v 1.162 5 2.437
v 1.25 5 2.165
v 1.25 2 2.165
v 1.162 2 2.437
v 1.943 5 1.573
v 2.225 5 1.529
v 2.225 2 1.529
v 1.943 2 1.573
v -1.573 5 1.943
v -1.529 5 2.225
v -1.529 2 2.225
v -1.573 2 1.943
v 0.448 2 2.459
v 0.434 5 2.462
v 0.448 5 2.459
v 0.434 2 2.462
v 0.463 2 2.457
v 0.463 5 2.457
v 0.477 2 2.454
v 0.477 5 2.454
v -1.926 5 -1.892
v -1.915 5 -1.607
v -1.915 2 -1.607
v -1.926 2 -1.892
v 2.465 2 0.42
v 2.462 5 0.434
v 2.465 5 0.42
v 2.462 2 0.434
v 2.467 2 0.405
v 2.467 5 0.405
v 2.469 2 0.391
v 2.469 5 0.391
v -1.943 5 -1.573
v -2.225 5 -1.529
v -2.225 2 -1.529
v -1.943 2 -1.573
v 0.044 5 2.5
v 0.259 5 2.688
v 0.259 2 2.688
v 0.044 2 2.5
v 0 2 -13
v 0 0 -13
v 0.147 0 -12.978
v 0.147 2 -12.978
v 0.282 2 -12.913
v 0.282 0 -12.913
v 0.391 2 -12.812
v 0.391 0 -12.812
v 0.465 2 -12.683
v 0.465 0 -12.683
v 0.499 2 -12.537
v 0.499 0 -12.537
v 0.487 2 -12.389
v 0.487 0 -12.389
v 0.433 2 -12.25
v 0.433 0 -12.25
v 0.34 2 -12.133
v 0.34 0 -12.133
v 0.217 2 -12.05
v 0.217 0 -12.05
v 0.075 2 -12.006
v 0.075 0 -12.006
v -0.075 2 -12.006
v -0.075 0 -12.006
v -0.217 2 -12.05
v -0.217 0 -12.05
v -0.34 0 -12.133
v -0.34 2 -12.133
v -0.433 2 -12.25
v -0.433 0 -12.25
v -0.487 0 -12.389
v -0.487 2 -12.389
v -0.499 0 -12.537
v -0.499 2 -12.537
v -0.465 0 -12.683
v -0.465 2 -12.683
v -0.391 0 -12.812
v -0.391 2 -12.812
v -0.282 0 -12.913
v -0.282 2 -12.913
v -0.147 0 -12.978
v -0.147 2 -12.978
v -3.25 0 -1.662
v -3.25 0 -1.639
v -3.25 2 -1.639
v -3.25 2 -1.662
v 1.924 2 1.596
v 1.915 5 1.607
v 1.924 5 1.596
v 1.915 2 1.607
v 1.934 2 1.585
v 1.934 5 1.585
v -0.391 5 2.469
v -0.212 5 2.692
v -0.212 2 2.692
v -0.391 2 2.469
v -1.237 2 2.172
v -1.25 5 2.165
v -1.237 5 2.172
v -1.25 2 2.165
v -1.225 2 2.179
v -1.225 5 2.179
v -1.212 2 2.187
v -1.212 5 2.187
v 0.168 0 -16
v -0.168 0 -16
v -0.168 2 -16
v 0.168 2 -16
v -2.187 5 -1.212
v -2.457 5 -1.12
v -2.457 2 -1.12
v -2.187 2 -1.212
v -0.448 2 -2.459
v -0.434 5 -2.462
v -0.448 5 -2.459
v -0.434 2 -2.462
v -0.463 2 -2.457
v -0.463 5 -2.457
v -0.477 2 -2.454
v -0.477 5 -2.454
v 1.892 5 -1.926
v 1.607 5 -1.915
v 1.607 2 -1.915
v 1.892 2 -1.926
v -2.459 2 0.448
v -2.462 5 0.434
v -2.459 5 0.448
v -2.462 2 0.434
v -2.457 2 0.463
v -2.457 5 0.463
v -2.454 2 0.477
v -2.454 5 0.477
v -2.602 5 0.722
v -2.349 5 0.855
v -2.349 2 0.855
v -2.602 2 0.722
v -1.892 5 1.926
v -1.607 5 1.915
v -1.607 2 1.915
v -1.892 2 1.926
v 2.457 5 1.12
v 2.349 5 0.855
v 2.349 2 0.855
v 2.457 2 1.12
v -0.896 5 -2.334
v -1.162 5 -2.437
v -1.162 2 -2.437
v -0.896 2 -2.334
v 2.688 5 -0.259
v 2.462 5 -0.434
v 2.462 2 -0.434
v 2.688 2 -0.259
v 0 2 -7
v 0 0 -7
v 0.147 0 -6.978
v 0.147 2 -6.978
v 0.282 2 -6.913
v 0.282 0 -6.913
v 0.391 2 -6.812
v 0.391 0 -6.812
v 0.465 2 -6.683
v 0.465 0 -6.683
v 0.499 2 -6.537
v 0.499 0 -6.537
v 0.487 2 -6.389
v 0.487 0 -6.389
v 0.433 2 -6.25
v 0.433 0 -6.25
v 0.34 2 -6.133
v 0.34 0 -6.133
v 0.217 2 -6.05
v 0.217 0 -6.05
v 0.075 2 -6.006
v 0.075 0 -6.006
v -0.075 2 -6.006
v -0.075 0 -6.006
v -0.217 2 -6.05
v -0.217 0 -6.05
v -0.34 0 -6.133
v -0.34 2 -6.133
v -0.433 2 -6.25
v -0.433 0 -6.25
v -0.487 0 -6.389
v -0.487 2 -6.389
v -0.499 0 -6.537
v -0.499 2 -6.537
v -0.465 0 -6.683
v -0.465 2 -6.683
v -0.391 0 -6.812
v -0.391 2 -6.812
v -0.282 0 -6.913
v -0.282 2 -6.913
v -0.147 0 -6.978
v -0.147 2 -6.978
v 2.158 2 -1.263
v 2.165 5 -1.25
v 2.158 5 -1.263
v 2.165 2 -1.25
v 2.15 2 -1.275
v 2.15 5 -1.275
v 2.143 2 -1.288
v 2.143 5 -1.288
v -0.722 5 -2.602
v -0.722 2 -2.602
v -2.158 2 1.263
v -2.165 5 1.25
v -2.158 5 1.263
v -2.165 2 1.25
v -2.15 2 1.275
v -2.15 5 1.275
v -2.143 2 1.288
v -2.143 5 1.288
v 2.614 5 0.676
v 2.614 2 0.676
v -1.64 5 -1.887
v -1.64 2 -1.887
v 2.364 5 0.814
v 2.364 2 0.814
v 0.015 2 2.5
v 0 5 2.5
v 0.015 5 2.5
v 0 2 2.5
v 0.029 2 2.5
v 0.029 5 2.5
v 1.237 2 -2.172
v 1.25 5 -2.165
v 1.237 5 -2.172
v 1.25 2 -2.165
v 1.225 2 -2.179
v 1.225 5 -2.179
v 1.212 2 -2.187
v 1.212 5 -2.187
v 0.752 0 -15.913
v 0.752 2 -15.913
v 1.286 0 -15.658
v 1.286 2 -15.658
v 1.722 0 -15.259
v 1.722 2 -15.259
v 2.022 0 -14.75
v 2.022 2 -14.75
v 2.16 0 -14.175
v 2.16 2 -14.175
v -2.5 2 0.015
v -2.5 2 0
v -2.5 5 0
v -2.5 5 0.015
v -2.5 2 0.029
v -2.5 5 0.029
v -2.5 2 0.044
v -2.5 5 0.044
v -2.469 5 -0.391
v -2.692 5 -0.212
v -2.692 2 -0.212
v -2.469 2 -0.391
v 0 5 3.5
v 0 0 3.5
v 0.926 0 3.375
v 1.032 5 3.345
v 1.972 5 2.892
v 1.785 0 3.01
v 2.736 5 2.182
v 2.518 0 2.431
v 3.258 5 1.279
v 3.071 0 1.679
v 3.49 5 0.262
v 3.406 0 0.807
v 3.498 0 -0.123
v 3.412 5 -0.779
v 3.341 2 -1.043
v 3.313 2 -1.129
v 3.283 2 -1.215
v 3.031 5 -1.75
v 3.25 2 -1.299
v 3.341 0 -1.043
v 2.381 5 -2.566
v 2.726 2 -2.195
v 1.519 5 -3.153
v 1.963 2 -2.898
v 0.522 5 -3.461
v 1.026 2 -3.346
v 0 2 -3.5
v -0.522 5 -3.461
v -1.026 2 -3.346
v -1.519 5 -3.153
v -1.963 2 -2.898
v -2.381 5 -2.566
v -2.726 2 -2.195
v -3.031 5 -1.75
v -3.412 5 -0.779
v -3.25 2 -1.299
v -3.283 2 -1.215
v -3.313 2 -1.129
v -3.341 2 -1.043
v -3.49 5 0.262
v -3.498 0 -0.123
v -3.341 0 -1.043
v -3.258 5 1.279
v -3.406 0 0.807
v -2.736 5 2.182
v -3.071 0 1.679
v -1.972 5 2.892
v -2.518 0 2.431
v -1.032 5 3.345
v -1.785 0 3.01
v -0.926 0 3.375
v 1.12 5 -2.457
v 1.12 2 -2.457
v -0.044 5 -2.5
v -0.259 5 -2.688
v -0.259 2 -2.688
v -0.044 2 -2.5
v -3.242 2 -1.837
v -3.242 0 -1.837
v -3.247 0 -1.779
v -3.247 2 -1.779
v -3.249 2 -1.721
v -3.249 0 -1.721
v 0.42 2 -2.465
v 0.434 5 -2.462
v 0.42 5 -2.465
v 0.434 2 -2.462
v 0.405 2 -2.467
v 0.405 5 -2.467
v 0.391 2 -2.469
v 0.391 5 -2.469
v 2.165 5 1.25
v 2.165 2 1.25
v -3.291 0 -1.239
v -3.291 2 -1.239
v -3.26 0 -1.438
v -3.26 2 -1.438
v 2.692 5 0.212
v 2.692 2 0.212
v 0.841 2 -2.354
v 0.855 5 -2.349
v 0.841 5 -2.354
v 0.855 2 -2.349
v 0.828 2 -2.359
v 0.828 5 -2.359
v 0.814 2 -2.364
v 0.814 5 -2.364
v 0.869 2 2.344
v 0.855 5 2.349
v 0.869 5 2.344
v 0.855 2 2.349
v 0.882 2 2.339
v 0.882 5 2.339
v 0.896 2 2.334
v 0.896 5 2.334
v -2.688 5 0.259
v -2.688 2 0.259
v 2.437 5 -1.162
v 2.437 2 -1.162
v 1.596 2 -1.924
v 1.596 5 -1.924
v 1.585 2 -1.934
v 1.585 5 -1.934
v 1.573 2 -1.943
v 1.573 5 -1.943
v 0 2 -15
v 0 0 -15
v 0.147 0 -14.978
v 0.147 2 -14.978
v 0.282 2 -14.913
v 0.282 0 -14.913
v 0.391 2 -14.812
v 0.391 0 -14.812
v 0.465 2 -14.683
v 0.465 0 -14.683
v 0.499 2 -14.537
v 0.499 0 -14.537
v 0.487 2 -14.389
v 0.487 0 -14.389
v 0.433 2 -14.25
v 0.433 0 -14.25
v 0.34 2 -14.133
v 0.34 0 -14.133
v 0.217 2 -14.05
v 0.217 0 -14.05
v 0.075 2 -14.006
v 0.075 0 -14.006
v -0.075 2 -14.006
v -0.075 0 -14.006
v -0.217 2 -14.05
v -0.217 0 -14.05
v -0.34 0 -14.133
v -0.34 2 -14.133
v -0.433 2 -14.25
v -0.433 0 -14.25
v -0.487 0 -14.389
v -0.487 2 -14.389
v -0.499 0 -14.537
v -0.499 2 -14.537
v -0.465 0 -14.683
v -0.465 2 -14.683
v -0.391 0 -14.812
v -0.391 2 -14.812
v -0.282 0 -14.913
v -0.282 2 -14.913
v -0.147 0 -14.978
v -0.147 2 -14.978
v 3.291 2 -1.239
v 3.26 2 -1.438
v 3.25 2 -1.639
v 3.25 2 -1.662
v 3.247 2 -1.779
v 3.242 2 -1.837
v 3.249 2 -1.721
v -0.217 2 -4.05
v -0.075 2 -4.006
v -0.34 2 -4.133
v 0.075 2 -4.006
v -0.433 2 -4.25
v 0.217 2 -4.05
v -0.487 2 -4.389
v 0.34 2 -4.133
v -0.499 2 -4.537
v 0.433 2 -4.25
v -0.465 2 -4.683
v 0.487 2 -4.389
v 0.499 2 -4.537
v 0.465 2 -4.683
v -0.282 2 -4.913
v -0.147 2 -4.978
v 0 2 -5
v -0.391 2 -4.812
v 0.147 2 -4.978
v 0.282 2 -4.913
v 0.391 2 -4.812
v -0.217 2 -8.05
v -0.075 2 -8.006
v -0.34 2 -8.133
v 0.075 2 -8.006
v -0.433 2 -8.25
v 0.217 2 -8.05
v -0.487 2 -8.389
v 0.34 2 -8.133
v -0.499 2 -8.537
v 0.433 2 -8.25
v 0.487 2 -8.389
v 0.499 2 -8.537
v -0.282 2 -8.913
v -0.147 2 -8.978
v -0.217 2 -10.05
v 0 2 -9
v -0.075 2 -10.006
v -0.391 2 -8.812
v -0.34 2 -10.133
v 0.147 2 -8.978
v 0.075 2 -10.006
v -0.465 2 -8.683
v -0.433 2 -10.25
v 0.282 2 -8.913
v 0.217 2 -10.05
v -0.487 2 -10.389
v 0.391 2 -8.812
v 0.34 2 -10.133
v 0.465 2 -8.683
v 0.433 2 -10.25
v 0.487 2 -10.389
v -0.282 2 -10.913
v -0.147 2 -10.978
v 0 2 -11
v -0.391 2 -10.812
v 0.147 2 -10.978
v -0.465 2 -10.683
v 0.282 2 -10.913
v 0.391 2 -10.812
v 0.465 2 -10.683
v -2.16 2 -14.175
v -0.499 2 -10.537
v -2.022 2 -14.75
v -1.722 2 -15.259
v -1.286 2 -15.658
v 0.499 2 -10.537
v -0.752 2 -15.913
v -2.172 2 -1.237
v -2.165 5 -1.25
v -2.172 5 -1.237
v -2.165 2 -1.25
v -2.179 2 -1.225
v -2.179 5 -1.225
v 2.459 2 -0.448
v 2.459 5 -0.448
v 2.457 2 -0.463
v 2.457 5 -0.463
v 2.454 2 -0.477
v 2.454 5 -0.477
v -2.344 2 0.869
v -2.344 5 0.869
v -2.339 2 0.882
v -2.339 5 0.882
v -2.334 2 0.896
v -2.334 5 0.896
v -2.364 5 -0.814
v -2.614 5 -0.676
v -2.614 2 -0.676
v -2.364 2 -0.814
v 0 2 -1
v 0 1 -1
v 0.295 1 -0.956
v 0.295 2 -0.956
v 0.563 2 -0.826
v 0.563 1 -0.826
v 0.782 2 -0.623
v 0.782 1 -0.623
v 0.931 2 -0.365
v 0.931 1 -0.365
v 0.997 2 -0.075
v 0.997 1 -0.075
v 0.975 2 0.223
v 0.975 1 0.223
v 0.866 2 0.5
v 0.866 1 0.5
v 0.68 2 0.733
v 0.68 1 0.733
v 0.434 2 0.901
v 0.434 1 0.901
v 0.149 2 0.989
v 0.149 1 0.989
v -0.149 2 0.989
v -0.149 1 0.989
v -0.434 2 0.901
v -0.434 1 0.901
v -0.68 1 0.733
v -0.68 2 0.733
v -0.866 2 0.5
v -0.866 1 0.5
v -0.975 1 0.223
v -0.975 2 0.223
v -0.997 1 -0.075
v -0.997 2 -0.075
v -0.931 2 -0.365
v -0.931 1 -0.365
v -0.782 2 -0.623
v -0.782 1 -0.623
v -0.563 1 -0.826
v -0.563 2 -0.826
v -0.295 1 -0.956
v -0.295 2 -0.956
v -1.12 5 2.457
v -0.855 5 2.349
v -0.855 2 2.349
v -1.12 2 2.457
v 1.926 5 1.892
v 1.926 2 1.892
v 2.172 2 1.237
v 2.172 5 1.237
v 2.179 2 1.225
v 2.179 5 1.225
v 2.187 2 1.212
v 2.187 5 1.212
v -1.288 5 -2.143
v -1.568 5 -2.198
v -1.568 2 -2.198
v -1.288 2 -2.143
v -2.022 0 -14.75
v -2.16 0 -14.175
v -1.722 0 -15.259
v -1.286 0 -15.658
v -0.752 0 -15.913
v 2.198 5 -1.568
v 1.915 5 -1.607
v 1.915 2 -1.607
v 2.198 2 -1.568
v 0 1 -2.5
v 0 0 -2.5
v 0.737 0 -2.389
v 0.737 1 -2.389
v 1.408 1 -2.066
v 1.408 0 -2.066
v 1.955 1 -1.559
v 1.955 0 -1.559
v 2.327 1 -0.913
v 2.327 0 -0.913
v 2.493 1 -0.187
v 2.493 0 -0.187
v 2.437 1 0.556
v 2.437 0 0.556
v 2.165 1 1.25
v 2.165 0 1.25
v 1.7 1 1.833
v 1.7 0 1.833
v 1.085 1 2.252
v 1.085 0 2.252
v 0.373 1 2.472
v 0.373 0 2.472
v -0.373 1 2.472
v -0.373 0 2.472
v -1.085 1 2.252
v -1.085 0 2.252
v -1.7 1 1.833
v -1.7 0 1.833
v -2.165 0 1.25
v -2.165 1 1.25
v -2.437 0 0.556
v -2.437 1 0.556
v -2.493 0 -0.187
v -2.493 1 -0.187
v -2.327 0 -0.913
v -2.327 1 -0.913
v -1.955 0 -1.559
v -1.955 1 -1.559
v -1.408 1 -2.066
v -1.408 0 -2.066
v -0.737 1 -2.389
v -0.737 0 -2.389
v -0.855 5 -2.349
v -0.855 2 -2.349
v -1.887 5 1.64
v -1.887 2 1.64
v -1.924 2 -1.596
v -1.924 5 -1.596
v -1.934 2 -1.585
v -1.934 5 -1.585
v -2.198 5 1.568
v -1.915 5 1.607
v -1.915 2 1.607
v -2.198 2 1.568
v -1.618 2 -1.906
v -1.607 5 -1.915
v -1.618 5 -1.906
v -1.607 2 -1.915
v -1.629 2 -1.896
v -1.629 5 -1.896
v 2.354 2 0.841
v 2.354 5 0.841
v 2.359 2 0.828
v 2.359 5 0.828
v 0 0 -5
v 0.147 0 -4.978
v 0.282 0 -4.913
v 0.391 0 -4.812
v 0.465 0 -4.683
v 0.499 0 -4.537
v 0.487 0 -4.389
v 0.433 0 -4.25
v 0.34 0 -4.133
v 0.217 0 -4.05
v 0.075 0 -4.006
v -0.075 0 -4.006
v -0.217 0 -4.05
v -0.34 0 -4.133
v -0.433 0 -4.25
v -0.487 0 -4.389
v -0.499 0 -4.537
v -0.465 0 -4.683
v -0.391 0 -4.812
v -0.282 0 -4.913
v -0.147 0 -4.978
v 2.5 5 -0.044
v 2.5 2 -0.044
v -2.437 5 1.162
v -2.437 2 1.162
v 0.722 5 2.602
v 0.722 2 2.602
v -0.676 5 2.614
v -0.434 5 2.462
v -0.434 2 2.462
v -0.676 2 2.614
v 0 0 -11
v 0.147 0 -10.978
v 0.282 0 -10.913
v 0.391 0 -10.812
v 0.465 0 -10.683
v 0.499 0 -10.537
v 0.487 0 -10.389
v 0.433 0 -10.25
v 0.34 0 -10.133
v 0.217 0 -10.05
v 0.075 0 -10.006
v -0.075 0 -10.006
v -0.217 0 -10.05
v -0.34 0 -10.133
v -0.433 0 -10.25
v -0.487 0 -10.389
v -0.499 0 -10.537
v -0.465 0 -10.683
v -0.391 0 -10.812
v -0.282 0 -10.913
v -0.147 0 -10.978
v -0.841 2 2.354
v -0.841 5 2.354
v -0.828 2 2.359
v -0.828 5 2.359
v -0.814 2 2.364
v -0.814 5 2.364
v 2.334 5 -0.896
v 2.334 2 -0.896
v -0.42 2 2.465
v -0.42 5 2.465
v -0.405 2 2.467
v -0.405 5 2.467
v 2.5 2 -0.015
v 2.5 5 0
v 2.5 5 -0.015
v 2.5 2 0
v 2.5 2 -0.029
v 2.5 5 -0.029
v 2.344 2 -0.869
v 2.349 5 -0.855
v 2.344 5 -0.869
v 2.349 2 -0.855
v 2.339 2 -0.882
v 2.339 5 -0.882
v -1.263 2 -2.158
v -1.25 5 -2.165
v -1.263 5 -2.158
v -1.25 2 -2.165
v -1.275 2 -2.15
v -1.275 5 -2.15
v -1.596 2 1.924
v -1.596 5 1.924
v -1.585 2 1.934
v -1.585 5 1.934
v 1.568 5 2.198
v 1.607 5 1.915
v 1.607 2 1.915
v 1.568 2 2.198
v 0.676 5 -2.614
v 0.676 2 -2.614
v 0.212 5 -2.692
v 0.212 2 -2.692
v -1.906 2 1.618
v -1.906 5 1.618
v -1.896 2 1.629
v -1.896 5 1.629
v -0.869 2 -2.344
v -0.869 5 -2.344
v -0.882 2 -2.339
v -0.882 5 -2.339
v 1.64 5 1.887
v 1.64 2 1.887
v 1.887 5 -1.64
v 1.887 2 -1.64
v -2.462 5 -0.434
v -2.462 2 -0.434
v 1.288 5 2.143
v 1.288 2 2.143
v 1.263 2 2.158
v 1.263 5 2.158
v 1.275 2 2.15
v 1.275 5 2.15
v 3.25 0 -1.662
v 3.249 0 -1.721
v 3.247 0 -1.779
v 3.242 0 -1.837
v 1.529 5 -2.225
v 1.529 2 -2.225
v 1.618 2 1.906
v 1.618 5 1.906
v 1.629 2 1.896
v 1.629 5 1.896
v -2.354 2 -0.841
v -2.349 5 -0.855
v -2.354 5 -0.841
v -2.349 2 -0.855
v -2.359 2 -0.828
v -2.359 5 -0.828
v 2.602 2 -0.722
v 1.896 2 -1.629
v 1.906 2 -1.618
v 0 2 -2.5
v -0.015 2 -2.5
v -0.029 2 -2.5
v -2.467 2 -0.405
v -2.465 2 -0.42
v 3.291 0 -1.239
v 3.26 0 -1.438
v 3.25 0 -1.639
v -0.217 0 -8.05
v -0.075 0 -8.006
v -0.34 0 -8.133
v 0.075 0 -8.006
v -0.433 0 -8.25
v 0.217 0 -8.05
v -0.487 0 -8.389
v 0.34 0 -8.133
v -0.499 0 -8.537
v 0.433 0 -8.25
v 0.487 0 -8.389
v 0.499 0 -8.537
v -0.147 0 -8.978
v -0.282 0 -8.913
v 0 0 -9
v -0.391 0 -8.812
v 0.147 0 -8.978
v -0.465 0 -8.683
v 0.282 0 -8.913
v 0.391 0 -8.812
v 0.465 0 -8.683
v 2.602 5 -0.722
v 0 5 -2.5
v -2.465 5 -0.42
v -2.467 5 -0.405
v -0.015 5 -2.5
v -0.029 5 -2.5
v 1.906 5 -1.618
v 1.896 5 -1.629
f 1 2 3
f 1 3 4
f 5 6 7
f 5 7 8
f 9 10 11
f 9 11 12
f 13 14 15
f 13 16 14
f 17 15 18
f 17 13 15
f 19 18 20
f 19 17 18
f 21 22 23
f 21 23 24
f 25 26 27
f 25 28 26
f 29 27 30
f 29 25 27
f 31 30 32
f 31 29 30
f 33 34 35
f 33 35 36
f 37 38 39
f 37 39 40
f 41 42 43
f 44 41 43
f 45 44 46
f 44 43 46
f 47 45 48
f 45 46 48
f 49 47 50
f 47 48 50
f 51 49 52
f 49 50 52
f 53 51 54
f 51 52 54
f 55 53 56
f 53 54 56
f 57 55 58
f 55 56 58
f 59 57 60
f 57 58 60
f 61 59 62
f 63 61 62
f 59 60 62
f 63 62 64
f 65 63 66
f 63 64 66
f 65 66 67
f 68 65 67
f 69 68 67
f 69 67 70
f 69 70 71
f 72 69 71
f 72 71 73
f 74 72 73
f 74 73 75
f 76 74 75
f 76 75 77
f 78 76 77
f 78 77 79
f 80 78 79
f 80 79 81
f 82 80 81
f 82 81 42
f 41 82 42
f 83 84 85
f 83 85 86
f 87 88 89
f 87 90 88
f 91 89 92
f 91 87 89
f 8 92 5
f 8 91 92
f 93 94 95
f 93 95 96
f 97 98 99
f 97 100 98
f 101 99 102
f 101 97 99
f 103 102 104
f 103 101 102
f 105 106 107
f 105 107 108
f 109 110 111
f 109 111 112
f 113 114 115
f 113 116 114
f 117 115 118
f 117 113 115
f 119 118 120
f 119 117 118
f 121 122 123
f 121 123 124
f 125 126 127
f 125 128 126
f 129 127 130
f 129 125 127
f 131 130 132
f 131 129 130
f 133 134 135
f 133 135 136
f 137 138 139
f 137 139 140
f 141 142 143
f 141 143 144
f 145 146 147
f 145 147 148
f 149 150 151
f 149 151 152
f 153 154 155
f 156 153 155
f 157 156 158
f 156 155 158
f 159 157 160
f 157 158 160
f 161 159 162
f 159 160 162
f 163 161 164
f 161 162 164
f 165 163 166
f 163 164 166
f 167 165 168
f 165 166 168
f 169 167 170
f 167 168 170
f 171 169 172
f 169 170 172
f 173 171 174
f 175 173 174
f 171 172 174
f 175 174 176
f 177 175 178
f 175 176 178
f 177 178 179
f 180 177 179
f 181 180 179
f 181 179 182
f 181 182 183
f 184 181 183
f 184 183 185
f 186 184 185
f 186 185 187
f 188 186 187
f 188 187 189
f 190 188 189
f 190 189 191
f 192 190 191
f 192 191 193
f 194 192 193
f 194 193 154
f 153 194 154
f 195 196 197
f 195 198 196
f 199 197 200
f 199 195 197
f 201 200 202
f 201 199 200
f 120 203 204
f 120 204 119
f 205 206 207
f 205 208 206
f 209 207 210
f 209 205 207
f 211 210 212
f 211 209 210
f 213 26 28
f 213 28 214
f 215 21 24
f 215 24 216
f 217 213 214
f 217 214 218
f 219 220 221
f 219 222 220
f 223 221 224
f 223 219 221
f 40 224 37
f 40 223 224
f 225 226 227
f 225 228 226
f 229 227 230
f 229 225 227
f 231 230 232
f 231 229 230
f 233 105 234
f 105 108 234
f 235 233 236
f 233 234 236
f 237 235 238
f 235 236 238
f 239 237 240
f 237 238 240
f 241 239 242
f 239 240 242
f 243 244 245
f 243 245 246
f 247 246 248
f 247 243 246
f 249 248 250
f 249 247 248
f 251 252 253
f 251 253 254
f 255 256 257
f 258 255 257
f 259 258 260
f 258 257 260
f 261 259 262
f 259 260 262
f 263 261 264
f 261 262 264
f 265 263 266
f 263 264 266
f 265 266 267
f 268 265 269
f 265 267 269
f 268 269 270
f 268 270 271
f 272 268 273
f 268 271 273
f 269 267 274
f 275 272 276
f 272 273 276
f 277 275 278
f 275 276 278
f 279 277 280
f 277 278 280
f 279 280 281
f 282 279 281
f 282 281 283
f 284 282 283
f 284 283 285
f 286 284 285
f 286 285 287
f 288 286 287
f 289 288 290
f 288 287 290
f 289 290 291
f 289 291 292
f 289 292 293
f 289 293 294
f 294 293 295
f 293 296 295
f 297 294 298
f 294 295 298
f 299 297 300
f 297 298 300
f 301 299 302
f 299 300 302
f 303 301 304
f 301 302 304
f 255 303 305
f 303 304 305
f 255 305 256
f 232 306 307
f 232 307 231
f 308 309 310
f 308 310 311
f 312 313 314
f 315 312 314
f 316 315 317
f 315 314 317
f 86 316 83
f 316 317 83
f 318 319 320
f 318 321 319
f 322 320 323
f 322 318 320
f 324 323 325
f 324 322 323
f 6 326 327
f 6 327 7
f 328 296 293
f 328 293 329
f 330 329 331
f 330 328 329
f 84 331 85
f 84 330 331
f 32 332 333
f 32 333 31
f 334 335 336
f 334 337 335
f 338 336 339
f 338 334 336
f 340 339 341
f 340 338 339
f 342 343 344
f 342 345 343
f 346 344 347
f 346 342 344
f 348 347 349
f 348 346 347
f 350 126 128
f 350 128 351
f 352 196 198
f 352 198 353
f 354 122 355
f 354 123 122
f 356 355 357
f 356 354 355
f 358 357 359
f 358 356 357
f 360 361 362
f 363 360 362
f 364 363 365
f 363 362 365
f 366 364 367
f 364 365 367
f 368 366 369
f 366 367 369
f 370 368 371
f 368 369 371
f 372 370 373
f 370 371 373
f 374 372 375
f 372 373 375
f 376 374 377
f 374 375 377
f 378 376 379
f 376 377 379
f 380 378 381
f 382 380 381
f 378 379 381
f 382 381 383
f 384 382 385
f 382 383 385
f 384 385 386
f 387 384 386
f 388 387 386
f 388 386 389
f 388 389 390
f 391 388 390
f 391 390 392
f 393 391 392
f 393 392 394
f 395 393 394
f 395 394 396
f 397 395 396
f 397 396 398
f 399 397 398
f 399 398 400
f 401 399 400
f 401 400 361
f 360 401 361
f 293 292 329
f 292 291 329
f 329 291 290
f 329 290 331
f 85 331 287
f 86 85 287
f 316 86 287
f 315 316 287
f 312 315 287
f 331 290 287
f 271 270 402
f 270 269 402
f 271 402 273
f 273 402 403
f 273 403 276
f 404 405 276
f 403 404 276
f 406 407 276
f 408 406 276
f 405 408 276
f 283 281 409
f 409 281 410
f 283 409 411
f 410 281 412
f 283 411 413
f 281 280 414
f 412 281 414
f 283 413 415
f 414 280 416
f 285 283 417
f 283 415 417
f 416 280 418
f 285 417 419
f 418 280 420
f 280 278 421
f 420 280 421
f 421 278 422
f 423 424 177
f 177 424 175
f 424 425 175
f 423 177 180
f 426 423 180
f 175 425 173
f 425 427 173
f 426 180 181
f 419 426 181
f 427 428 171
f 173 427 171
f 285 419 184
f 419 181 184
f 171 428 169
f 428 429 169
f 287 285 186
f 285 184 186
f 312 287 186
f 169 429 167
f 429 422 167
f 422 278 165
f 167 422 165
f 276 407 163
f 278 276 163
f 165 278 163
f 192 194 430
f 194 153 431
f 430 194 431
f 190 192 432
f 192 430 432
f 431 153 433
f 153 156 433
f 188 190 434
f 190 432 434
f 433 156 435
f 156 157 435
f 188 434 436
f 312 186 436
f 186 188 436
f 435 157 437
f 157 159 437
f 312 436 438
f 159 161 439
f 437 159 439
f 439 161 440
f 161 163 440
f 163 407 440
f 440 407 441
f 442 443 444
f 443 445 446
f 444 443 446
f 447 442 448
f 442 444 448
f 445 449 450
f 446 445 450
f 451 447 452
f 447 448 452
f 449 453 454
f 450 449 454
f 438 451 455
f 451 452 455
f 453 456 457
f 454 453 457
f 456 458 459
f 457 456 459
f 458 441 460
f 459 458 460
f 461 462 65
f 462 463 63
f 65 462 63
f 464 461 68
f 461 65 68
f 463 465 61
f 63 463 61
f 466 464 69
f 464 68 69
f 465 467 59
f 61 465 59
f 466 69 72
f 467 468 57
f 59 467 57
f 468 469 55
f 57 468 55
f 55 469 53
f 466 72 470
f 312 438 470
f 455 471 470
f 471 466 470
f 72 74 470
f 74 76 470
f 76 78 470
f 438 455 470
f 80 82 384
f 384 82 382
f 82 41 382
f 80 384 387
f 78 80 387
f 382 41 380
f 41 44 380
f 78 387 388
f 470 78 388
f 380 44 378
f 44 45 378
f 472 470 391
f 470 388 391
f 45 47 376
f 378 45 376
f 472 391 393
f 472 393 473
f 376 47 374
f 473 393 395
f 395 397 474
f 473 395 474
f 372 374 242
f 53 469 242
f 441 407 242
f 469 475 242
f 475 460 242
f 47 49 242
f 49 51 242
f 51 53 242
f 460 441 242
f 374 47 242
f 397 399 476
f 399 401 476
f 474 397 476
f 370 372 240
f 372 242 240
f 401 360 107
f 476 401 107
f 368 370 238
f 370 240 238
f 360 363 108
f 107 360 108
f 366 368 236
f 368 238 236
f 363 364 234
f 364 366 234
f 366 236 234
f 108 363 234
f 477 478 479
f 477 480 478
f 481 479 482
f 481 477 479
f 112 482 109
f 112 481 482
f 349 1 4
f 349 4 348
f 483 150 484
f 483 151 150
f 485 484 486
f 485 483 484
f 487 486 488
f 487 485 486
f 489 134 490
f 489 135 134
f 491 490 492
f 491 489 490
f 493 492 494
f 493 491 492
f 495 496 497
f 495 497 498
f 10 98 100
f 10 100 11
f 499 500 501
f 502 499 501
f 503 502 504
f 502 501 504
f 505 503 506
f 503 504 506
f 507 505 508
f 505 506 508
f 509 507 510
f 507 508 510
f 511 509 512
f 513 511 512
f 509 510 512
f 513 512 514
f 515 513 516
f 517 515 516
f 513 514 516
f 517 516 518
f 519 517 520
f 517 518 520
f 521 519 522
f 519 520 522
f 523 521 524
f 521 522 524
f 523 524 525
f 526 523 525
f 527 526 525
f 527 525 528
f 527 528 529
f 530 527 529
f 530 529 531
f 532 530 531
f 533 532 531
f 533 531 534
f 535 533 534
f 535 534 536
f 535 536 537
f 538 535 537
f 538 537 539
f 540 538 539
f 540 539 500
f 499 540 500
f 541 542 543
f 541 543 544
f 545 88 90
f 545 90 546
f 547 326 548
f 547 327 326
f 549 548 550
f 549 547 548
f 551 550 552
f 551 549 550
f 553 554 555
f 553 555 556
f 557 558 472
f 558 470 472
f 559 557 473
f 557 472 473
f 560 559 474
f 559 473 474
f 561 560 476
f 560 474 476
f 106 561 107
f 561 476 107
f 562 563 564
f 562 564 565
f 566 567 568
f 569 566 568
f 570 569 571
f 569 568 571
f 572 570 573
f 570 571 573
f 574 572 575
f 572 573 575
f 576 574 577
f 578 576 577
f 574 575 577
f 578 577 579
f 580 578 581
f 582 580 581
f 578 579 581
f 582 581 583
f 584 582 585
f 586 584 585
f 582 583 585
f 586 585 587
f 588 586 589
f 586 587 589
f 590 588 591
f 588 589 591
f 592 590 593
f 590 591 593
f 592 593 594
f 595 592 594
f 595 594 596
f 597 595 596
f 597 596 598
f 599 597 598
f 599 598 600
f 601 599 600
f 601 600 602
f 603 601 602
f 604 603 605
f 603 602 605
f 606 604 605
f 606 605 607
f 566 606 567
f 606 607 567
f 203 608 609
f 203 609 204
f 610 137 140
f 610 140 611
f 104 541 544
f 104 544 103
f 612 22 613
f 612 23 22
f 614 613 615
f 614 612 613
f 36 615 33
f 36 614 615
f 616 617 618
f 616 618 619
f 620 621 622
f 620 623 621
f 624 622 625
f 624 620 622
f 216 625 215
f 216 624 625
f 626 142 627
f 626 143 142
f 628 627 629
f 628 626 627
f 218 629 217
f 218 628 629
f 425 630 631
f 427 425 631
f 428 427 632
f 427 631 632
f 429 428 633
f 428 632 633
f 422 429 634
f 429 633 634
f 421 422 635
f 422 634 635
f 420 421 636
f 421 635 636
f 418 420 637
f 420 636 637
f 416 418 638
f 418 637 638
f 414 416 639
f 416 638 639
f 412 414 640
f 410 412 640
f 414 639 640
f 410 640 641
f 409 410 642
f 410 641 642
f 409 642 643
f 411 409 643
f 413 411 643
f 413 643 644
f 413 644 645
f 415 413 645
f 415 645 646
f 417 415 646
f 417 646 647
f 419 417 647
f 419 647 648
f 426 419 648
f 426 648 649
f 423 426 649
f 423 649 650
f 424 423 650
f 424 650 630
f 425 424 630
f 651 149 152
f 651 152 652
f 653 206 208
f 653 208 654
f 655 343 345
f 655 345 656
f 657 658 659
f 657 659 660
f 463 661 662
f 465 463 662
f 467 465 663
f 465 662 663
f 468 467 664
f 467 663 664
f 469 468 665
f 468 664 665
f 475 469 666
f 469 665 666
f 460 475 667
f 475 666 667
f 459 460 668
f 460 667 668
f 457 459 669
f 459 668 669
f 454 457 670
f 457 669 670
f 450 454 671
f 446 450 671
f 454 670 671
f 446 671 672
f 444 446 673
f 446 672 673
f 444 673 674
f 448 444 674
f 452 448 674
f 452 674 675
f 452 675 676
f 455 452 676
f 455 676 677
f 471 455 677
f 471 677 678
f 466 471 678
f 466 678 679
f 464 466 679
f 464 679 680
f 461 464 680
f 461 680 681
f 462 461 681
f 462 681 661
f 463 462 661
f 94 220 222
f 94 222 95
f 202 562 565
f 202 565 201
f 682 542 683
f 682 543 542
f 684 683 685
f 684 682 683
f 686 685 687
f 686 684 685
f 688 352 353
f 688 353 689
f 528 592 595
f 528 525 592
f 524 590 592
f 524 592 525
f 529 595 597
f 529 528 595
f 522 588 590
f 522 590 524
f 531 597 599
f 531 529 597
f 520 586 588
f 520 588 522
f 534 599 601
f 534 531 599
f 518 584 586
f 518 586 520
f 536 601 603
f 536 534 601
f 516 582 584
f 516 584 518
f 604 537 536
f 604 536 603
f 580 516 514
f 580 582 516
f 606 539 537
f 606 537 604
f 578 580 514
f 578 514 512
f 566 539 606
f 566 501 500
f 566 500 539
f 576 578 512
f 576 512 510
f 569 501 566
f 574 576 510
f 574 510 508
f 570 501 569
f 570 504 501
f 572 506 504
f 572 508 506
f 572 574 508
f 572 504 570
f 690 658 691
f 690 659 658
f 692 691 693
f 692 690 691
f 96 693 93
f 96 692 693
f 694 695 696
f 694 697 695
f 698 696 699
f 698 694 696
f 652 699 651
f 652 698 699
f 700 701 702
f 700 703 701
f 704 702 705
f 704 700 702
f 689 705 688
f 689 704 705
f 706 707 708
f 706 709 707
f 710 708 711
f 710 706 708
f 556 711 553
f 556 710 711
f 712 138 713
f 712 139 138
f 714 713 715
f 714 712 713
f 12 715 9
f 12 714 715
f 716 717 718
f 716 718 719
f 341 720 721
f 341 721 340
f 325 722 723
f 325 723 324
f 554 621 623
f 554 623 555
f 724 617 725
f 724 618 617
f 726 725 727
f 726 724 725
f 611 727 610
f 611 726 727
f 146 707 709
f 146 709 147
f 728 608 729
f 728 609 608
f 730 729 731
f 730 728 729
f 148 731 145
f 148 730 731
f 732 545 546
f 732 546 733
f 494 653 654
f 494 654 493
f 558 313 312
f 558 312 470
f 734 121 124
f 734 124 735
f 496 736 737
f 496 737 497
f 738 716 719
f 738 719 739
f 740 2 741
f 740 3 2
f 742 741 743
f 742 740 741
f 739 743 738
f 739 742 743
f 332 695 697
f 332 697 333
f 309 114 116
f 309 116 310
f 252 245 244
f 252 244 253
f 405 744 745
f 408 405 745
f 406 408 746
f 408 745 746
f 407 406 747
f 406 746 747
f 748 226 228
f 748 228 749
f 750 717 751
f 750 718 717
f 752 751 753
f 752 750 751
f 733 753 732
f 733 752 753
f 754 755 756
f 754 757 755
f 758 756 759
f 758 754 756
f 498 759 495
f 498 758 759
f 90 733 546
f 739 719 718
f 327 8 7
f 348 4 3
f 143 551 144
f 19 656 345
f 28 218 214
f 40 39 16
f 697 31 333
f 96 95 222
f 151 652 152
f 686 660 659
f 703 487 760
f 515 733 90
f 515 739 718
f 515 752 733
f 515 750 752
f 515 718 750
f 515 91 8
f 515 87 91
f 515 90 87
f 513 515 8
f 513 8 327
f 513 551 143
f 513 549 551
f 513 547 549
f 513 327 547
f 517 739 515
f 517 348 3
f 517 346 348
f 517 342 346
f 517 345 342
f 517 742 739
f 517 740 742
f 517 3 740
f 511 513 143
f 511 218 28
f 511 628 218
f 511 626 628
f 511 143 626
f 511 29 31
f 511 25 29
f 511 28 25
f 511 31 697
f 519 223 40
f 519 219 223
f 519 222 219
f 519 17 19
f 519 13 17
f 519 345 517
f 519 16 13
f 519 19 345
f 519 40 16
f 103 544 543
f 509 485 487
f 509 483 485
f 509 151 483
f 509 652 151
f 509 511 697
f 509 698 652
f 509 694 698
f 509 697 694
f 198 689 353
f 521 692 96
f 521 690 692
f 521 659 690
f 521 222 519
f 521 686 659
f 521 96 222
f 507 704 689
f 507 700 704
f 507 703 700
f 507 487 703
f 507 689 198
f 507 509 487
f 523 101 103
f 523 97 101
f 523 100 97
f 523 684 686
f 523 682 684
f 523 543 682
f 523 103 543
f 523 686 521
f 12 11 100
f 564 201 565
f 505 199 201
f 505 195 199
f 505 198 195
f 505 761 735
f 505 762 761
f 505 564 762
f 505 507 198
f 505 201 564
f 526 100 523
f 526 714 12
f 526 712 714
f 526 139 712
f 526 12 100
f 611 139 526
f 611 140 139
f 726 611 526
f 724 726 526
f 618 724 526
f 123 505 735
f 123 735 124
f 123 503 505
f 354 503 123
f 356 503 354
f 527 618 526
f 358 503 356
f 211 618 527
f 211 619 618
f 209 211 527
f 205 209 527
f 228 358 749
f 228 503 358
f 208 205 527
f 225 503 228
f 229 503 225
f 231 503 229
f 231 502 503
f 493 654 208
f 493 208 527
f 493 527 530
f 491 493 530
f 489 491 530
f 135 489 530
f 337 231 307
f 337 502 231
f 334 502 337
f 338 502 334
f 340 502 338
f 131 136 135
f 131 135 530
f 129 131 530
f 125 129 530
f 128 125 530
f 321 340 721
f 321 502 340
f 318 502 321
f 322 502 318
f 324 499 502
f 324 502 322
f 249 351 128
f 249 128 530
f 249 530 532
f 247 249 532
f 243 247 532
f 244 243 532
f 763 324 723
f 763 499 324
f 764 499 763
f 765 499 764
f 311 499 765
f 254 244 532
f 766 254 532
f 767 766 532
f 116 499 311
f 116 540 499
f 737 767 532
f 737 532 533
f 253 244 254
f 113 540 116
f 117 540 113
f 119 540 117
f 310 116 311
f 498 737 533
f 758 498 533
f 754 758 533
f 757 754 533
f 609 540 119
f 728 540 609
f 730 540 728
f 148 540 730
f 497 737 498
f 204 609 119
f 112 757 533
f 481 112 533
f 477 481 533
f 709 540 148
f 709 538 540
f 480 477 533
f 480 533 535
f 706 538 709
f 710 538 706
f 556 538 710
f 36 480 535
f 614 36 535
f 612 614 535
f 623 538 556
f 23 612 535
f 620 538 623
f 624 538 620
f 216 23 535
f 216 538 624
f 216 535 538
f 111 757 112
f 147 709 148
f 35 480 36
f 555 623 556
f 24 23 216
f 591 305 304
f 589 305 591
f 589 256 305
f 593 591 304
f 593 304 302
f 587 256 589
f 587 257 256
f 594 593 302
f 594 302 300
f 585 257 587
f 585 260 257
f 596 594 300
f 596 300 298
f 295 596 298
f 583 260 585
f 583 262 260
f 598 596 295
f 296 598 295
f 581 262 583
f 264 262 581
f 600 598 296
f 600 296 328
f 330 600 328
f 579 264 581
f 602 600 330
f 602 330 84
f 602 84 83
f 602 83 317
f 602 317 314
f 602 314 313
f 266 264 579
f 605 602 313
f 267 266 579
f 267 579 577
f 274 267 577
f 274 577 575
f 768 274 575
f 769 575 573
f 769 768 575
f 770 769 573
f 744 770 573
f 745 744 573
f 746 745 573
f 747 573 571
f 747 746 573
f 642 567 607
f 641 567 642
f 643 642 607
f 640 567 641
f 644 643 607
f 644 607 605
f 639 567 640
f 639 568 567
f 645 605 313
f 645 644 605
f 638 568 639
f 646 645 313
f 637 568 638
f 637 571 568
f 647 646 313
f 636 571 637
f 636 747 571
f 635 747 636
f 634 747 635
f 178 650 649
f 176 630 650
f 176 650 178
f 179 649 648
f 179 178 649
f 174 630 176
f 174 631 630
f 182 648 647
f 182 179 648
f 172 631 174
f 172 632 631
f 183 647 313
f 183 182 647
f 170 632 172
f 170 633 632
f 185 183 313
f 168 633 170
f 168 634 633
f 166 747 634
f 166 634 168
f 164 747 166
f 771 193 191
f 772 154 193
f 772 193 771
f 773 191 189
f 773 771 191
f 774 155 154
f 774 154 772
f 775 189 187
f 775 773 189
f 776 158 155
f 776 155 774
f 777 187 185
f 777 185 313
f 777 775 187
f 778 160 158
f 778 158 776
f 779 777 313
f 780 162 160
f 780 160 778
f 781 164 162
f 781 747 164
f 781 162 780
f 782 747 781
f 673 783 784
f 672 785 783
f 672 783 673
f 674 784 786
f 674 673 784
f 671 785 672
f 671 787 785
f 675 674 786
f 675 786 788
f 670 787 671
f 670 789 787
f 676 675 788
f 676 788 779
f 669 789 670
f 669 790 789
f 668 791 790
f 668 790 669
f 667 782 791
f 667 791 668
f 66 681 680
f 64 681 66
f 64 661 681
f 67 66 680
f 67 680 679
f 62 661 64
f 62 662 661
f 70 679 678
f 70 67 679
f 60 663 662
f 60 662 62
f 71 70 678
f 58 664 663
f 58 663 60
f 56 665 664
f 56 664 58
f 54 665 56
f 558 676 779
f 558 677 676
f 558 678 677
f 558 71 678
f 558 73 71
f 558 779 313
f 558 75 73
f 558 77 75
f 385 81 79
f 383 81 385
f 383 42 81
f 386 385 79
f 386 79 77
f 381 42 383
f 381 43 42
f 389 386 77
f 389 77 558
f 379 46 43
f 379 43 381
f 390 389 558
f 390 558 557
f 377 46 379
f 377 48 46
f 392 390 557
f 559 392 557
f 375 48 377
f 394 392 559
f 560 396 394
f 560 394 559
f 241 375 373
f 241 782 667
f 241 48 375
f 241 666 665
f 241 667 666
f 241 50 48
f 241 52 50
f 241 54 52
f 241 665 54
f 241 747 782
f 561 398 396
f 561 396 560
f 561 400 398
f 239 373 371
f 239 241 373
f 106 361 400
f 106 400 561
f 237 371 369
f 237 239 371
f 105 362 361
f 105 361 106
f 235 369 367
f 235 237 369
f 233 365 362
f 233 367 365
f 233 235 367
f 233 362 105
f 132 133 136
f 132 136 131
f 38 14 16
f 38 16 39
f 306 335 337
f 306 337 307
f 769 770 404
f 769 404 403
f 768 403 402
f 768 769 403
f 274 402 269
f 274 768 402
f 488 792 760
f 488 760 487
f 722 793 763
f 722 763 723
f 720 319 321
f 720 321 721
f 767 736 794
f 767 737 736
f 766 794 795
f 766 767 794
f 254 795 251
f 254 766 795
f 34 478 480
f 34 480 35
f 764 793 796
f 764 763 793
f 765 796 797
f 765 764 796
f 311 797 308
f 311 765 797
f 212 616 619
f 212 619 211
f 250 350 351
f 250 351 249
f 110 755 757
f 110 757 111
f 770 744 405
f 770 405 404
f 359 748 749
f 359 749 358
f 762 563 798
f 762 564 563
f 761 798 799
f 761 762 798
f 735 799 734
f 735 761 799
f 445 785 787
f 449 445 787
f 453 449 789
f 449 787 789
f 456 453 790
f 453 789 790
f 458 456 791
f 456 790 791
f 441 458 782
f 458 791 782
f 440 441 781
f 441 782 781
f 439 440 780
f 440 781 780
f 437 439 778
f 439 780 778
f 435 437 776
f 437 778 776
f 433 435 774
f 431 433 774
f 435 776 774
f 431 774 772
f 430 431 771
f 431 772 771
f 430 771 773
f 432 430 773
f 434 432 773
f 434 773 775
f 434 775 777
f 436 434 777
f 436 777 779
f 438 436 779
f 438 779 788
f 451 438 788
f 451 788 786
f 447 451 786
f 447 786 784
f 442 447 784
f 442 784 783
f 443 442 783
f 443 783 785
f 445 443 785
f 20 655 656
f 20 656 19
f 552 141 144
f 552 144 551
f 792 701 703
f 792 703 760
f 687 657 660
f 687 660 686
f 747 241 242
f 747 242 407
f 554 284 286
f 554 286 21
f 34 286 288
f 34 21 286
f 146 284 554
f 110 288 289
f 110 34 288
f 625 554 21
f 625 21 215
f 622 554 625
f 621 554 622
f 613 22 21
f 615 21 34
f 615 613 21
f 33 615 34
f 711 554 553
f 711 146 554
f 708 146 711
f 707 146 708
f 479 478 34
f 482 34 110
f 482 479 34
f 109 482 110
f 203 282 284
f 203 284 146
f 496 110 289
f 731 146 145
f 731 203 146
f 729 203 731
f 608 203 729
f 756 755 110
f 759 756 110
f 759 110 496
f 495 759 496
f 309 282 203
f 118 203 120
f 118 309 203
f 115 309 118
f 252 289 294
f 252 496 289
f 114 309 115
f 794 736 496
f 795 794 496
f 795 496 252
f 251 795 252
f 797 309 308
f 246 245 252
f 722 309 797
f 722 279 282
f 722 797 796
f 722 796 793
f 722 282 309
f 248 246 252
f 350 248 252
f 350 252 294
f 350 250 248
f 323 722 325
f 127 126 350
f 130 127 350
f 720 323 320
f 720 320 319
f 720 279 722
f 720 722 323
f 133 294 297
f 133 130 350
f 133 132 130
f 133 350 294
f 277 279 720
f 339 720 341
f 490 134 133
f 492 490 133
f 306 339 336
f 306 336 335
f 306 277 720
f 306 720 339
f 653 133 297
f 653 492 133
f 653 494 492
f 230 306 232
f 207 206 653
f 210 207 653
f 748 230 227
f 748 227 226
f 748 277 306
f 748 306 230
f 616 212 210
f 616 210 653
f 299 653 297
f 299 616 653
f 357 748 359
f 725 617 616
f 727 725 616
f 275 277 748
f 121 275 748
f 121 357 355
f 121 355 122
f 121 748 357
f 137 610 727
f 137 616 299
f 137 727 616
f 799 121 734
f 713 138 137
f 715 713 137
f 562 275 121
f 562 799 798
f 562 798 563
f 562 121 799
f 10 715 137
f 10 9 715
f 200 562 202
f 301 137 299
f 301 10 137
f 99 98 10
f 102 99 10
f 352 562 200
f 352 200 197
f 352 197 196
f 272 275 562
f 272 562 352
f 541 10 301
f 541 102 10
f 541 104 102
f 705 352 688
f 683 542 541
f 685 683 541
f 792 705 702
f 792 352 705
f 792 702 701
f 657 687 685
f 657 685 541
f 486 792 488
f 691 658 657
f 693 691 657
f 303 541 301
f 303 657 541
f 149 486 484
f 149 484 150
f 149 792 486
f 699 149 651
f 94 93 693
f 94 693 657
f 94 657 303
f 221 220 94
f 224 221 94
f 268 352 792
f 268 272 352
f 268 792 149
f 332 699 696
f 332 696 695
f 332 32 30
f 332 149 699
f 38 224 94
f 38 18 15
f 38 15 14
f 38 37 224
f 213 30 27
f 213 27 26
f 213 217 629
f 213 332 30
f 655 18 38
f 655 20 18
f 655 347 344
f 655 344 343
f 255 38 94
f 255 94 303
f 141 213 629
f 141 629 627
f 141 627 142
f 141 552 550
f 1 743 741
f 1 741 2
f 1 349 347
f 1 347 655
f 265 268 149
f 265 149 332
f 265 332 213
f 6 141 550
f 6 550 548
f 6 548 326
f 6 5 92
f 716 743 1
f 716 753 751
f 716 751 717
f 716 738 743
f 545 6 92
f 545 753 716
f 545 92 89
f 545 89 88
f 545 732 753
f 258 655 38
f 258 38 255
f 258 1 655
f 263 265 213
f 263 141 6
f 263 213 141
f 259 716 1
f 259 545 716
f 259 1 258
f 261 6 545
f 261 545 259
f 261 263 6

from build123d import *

# Parameters (mm, degrees)
BOSS_EXTRUDE1_DEPTH      = 2
FILLET1_R                = 2
BOSS_EXTRUDE2_DEPTH      = 3
BOSS_EXTRUDE2_DEPTH_BACK = 2
SKETCH2_R                = 3.5
SKETCH3_R                = 2.5
CUT_EXTRUDE1_DEPTH       = 1
SKETCH4_R                = 1
CUT_EXTRUDE2_DEPTH       = 17.8597153
CUT_EXTRUDE3_START       = -3
SKETCH5_R                = 2.5
CUT_EXTRUDE3_DEPTH       = 3
CUT_EXTRUDE4_DEPTH       = 3
CIRPATTERN1_COUNT        = 36
SKETCH9_R                = 0.5
CUT_EXTRUDE5_DEPTH       = 18.12454379
LPATTERN1_COUNT          = 6
LPATTERN1_PITCH          = 2
FILLET3_R                = 2


with BuildPart() as part:
    # Sketch1 → Boss-Extrude1 (new body)
    with BuildSketch(Plane(origin=(0, 0, 0), x_dir=(1, 0, 0), z_dir=(0, 1, 0))):
        Polygon((-3.25, 0), (-3.25, 1.75), (-2, 16), (2, 16), (3.25, 1.75), (3.25, 0), align=None)
    extrude(amount=BOSS_EXTRUDE1_DEPTH)

    # Fillet1
    fillet1_edges = [part.edges().sort_by_distance(p)[0] for p in [
        (-2, 1, -16),
        (2, 1, -16),
    ]]
    fillet(fillet1_edges, radius=FILLET1_R)

    # Sketch2 → Boss-Extrude2 (add, two sides: drawn at the far end of the back side and taken through both)
    with BuildSketch(Plane(origin=(0, 2, 0), x_dir=(1, 0, 0), z_dir=(0, 1, 0)).offset(-BOSS_EXTRUDE2_DEPTH_BACK)):
        with Locations(Location((0, 0, 0), (0, 0, 270))):
            Circle(SKETCH2_R)
    extrude(amount=BOSS_EXTRUDE2_DEPTH + BOSS_EXTRUDE2_DEPTH_BACK)

    # Sketch3 → Cut-Extrude1 (cut)
    with BuildSketch(Plane(origin=(0, 0, 0), x_dir=(-1, 0, 0), z_dir=(0, -1, 0))):
        with Locations(Location((0, 0, 0), (0, 0, 90))):
            Circle(SKETCH3_R)
    extrude(amount=-CUT_EXTRUDE1_DEPTH, mode=Mode.SUBTRACT)

    # Sketch4 → Cut-Extrude2 (cut, through all)
    with BuildSketch(Plane(origin=(0, 1, 0), x_dir=(-1, 0, 0), z_dir=(0, -1, 0))):
        with Locations(Location((0, 0, 0), (0, 0, 90))):
            Circle(SKETCH4_R)
    extrude(amount=-CUT_EXTRUDE2_DEPTH, mode=Mode.SUBTRACT)

    # Sketch5 → Cut-Extrude3 (cut)
    with BuildSketch(Plane(origin=(0, 5, 0), x_dir=(1, 0, 0), z_dir=(0, 1, 0)).offset(CUT_EXTRUDE3_START)):
        with Locations(Location((0, 0, 0), (0, 0, 90))):
            Circle(SKETCH5_R)
    extrude(amount=CUT_EXTRUDE3_DEPTH, mode=Mode.SUBTRACT)

    # Sketch6 → Cut-Extrude4 (cut)
    with BuildSketch(Plane(origin=(0, 5, 0), x_dir=(1, 0, 0), z_dir=(0, 1, 0))):
        Polygon((-2.5, 0), (-2.691676801, 0.211839558), (-2.469220851, 0.391086163), align=None)
    cut_extrude4 = extrude(amount=-CUT_EXTRUDE4_DEPTH, mode=Mode.SUBTRACT)

    # CirPattern1: Cut-Extrude4 ×36 about axis
    cirpattern1_axis = Axis((0, 0, 0), (0, 1, 0))
    for i in range(1, CIRPATTERN1_COUNT):
        add(cut_extrude4.rotate(cirpattern1_axis, i * 360 / CIRPATTERN1_COUNT), mode=Mode.SUBTRACT)

    # Sketch9 → Cut-Extrude5 (cut, through all)
    with BuildSketch(Plane(origin=(0, 0, 0), x_dir=(-1, 0, 0), z_dir=(0, -1, 0))):
        with Locations(Location((0, 14.5, 0), (0, 0, 90))):
            Circle(SKETCH9_R)
    cut_extrude5 = extrude(amount=-CUT_EXTRUDE5_DEPTH, mode=Mode.SUBTRACT)

    # LPattern1: Cut-Extrude5 ×6
    with Locations(*[(0, 0, i * LPATTERN1_PITCH) for i in range(1, LPATTERN1_COUNT)]):
        add(cut_extrude5, mode=Mode.SUBTRACT)

    # Fillet3
    # the kernel refuses this fillet: 2 mm, written as the material it adds along each edge
    with BuildSketch(Plane(origin=(-3.25, 0, -1.299038106), x_dir=(0, 0, -1), z_dir=(0, 1, 0))) as fillet3_piece_1:
        with BuildLine():
            CenterArc((0.340321525, 2), FILLET3_R, 252.658557197, 17.341442803)
            ThreePointArc((-0.25580925, 0.090909091), (-0.127022856, 0.047935757), (0, 0))
            Line((0, 0), (0.340321525, 0))
        make_face()
    extrude(amount=2)
    with BuildSketch(Plane(origin=(3.25, 0, -1.299038106), x_dir=(0.3348614999479688, 0, 0.9422673590083636), z_dir=(0, 1, 0))) as fillet3_piece_2:
        with BuildLine():
            CenterArc((0.349049135, 1.998495294), FILLET3_R, 250.435883949, 17.341442803)
            Line((-0.320673865, 0.113960576), (0, 0))
            ThreePointArc((0, 0), (0.13574133, 0.002633235), (0.271482661, 0))
        make_face()
    extrude(amount=2)
    # the kernel refuses this fillet: 2 mm, written as the material it takes off along each edge
    with BuildSketch(Plane(origin=(3.25, -0.218878004, -1.75), x_dir=(0, 0, 1), z_dir=(0, 1, 0)), Plane(origin=(-3.25, -0.218878004, -1.75), x_dir=(0.08738374771484407, 0, -0.9961747239492218), z_dir=(0, 1, 0))) as fillet3_2_piece_1:
        with BuildLine():
            CenterArc((FILLET3_R * 0.043775600736, -FILLET3_R), FILLET3_R, 90, 5.013113755)
            Line((-FILLET3_R * 0.0436081469789, -FILLET3_R * 0.00382527605078), (0, 0))
            Line((0, 0), (FILLET3_R * 0.043775600736, 0))
        make_face()
    extrude(amount=2.437756007, mode=Mode.SUBTRACT)


solid = part.part
